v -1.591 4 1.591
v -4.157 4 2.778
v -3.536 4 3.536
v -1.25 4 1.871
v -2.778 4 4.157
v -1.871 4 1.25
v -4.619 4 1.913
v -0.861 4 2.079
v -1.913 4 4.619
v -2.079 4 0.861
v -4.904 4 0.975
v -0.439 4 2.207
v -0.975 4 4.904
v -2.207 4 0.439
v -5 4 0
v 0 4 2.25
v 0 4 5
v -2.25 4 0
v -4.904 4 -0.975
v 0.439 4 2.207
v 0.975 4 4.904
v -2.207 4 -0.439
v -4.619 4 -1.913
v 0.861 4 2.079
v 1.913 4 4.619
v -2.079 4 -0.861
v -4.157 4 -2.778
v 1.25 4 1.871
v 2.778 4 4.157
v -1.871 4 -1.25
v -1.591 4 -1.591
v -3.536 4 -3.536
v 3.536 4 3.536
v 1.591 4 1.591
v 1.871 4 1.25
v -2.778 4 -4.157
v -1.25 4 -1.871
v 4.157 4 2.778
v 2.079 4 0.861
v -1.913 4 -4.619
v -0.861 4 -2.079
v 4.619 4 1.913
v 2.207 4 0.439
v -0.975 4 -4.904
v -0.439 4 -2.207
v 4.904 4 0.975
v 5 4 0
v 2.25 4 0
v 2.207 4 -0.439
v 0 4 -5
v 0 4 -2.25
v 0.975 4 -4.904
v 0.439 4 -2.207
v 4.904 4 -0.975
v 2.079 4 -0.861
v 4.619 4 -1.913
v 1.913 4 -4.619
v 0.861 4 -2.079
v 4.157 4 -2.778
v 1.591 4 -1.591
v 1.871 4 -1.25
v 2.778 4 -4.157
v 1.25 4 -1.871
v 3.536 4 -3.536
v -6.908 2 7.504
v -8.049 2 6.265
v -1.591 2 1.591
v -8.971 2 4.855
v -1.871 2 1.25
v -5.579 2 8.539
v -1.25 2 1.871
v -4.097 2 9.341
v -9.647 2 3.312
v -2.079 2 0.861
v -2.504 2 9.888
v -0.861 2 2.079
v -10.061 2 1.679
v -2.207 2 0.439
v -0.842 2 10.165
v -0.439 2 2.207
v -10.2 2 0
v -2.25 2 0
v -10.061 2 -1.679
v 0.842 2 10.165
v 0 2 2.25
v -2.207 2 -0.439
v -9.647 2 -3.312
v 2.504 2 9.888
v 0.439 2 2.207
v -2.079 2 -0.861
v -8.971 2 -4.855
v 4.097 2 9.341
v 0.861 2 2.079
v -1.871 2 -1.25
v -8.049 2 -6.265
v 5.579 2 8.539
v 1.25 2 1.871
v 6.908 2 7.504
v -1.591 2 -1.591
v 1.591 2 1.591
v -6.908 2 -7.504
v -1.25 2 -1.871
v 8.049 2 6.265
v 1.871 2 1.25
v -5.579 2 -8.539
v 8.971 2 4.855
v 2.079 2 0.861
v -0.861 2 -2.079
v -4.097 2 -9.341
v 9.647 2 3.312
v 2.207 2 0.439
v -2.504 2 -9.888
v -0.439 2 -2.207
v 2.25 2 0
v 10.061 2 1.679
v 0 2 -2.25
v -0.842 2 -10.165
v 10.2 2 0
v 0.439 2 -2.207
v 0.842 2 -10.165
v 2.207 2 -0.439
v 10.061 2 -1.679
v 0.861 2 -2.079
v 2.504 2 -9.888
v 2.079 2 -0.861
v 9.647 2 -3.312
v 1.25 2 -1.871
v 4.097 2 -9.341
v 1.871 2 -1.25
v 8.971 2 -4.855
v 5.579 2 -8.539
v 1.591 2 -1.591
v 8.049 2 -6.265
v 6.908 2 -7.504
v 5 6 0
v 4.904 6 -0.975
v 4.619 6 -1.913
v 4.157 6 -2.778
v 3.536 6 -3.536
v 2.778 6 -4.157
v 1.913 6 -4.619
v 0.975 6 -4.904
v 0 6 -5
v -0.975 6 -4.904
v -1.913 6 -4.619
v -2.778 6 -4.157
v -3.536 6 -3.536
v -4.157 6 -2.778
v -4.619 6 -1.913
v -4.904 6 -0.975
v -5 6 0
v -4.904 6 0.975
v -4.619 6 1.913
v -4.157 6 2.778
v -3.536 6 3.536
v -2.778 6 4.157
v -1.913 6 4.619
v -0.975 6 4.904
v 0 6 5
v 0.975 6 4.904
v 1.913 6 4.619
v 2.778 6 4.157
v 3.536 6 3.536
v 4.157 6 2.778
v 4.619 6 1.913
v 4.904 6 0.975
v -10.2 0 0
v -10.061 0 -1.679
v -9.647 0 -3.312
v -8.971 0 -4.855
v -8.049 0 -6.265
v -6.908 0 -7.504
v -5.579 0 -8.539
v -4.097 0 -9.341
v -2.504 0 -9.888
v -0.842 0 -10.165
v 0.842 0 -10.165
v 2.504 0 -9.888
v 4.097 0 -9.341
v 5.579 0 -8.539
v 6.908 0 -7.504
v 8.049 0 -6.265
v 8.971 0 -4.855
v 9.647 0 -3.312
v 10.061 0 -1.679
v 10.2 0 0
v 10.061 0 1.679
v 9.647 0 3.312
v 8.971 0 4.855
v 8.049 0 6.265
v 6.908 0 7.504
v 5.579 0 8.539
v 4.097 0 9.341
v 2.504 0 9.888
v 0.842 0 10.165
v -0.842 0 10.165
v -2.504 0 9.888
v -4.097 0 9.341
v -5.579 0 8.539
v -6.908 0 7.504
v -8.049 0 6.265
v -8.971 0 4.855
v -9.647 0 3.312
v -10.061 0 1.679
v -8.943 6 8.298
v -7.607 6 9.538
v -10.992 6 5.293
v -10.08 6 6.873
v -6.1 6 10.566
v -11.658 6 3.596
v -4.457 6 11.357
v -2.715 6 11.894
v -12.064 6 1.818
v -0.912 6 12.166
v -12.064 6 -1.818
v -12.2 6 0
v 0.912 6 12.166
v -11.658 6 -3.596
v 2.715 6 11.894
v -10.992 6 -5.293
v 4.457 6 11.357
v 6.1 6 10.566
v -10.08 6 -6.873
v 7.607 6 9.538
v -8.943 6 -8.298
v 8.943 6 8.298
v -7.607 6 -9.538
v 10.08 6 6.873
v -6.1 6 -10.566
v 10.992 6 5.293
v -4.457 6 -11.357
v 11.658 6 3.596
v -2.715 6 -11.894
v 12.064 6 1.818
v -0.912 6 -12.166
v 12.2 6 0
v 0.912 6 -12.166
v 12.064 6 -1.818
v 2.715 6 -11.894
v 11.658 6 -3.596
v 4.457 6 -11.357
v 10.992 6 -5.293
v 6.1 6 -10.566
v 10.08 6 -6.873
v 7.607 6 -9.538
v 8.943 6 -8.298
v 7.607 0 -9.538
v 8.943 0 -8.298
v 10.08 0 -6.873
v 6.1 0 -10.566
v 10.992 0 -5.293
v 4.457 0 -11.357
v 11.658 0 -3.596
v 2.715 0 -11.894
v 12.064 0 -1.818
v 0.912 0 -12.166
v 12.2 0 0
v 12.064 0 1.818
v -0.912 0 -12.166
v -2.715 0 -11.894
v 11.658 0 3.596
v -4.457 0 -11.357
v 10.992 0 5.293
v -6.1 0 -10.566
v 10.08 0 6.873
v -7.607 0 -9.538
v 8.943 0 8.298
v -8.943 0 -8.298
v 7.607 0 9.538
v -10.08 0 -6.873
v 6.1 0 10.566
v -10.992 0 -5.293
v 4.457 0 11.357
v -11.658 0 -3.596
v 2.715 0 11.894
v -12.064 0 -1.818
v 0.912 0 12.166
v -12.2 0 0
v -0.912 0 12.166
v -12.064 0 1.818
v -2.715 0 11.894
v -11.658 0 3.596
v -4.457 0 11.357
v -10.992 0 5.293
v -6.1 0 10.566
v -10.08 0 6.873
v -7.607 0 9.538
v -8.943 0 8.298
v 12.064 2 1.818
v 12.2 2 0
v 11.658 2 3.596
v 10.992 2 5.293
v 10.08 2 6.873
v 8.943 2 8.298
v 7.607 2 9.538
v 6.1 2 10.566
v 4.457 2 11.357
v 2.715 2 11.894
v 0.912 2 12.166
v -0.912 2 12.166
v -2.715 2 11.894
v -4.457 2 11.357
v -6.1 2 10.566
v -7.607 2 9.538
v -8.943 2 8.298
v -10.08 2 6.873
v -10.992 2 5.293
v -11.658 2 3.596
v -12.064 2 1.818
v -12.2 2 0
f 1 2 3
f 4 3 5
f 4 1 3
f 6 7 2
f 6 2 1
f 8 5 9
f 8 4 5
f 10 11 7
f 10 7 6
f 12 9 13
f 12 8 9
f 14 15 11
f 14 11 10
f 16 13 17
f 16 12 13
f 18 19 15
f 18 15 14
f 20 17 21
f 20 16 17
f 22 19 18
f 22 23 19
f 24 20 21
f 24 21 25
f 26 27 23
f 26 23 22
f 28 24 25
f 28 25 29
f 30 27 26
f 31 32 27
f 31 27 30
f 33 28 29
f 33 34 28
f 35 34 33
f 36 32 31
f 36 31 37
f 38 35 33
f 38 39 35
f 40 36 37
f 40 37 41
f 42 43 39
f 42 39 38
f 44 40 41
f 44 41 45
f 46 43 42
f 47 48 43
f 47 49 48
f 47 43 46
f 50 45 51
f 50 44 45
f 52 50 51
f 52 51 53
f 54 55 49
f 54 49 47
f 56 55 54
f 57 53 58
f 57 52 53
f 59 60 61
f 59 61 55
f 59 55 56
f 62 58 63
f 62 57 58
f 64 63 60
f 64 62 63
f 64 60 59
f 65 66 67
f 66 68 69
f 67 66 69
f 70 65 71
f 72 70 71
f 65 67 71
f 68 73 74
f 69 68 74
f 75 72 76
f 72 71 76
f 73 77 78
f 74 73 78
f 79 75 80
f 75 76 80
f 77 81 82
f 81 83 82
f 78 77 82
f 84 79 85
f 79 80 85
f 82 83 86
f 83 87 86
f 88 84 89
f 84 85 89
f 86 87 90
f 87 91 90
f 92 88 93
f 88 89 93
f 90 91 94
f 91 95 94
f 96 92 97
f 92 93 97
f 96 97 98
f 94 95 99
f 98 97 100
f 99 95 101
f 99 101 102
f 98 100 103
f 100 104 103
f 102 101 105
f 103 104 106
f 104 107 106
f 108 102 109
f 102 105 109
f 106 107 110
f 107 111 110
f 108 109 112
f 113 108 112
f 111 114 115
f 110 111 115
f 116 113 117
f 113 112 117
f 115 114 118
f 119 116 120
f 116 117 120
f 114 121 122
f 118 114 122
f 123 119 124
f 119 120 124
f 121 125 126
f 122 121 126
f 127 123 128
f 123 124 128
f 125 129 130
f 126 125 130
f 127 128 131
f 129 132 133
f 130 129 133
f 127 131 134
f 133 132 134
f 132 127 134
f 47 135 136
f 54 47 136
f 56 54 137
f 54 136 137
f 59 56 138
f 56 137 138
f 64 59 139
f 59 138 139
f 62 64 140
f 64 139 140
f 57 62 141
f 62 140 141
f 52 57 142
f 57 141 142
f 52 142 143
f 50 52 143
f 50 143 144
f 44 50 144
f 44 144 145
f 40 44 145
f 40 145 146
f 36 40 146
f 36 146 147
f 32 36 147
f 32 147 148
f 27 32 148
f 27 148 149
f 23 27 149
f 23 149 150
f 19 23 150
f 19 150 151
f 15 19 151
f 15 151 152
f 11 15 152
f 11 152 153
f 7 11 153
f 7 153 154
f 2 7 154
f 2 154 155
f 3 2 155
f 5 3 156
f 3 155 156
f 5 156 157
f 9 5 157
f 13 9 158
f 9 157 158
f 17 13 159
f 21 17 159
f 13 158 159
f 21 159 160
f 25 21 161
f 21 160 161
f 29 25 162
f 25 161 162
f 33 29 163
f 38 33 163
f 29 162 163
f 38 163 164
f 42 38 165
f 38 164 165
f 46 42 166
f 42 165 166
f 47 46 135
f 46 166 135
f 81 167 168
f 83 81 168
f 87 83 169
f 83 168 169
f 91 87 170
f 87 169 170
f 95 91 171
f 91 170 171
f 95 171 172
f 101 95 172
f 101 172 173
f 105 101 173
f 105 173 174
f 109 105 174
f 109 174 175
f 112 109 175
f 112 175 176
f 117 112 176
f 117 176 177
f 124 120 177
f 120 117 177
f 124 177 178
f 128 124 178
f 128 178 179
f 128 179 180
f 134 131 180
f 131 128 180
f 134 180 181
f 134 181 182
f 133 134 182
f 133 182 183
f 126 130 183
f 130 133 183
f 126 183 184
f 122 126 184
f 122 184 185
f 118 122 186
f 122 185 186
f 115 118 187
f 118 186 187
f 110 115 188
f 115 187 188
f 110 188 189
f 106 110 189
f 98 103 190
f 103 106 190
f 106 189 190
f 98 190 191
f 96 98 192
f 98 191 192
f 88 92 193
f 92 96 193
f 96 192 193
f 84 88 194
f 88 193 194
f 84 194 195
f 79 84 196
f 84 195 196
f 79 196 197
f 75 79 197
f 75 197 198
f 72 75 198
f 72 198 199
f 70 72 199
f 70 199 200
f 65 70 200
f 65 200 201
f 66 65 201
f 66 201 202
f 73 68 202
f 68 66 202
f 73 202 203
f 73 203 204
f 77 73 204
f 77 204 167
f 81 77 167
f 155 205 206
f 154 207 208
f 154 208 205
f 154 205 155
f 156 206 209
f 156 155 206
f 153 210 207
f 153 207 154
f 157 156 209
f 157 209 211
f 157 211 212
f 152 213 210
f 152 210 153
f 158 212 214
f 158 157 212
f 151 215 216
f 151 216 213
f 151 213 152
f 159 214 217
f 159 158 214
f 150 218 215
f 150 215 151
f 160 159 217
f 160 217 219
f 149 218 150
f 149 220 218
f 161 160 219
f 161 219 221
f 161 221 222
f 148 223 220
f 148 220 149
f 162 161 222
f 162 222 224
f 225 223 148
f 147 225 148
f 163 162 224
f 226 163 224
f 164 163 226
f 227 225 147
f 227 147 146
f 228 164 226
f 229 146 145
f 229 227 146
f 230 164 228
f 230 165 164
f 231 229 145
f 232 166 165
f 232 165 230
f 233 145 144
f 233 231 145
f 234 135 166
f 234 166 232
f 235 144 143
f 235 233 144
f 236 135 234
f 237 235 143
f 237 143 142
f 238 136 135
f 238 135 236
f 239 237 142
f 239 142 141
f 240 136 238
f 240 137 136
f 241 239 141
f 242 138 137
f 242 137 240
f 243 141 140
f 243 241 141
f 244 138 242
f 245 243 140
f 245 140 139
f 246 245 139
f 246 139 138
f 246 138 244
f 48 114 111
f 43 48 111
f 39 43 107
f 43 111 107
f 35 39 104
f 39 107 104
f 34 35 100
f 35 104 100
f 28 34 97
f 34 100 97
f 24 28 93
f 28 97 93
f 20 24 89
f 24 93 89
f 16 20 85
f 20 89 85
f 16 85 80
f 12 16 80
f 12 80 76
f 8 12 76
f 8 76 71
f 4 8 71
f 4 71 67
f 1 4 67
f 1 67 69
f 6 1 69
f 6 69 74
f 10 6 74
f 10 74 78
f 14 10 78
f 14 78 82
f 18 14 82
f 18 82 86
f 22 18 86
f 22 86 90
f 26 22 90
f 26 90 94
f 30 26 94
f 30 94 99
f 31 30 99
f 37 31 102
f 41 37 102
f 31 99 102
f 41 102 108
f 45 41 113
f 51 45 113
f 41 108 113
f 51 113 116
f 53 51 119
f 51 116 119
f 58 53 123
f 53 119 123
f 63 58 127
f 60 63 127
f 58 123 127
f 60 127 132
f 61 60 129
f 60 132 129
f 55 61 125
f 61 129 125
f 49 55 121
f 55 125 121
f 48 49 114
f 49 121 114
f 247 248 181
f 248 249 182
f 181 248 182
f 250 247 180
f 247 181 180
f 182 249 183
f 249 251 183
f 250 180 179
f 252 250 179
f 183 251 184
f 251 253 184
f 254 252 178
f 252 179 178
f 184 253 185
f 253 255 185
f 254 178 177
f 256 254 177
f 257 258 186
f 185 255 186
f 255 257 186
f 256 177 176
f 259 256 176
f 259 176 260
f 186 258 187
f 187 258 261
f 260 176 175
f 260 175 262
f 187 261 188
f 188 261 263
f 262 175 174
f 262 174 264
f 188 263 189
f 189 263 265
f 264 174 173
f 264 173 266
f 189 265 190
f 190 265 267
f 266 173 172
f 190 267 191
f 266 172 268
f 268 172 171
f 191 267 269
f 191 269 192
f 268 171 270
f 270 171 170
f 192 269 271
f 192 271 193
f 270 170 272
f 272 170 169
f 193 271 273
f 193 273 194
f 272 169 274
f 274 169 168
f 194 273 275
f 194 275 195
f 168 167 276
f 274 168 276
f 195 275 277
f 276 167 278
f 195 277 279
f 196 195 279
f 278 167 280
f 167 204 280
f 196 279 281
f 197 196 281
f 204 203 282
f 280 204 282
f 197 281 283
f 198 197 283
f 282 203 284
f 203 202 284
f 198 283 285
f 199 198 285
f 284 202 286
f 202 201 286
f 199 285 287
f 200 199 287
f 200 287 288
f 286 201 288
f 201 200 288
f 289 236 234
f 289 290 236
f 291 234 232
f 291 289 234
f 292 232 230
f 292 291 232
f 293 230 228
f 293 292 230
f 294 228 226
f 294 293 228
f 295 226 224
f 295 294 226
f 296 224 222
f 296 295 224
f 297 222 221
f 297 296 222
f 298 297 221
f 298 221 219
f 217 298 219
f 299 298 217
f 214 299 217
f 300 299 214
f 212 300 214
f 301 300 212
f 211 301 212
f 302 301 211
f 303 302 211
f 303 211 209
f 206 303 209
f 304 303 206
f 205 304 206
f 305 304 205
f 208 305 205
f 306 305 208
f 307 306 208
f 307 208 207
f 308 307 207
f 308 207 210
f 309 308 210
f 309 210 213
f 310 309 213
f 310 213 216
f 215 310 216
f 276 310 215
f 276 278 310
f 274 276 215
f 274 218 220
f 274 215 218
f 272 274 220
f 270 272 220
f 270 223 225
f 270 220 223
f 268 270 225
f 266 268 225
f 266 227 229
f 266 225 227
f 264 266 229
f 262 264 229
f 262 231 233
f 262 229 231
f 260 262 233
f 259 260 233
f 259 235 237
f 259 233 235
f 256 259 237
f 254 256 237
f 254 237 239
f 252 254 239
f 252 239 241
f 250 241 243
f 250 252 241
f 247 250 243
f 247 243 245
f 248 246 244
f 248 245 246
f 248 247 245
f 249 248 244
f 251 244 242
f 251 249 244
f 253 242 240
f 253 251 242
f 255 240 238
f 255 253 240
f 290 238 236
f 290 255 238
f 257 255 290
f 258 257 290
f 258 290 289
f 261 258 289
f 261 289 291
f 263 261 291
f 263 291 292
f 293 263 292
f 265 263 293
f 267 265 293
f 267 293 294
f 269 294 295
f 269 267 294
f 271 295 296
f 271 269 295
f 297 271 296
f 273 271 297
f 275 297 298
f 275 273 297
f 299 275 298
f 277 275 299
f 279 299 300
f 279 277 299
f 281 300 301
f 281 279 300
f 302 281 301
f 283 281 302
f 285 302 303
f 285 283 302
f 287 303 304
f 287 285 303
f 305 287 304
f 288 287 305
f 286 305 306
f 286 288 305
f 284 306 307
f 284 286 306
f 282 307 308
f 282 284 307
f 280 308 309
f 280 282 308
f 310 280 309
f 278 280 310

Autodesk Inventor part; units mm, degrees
ref_plane "YZ Plane" through (0, 0, 0) normal (1, 0, 0) x (0, 1, 0)
ref_plane "XZ Plane" through (0, 0, 0) normal (0, 1, 0) x (-1, 0, 0)
ref_plane "XY Plane" through (0, 0, 0) normal (0, 0, 1) x (1, 0, 0)
sketch "Boceto1" plane through (0, 0, 0) normal (0, 1, 0) x (-1, 0, 0)
  circle A0 centre (0, 0) radius 10.2
  circle A1 centre (0, 0) radius 12.2
  dimension "d0" = 20.4
  dimension "d1" = 2
extrude "Extrusión1" add sketch "Boceto1" along normal blind 2
sketch "Boceto2" plane through (0, 2, 0) normal (0, 1, 0) x (1, 0, 0)
  circle A0 centre (0, 0) radius 12.2 projected
  circle A1 centre (0, 0) radius 10.2 projected
  circle A2 centre (0, 0) radius 2.25
  dimension "d4" = 4.5
extrude "Extrusión2" add sketch "Boceto2" along normal blind 4 contours A0 | A1
sketch "Boceto3" plane through (0, 6, 0) normal (0, 1, 0) x (1, 0, 0)
  circle A0 centre (0, 0) radius 5
  dimension "d7" = 10
extrude "Extrusión3" cut sketch "Boceto3" against normal blind 2
properties part number "springsupport"
